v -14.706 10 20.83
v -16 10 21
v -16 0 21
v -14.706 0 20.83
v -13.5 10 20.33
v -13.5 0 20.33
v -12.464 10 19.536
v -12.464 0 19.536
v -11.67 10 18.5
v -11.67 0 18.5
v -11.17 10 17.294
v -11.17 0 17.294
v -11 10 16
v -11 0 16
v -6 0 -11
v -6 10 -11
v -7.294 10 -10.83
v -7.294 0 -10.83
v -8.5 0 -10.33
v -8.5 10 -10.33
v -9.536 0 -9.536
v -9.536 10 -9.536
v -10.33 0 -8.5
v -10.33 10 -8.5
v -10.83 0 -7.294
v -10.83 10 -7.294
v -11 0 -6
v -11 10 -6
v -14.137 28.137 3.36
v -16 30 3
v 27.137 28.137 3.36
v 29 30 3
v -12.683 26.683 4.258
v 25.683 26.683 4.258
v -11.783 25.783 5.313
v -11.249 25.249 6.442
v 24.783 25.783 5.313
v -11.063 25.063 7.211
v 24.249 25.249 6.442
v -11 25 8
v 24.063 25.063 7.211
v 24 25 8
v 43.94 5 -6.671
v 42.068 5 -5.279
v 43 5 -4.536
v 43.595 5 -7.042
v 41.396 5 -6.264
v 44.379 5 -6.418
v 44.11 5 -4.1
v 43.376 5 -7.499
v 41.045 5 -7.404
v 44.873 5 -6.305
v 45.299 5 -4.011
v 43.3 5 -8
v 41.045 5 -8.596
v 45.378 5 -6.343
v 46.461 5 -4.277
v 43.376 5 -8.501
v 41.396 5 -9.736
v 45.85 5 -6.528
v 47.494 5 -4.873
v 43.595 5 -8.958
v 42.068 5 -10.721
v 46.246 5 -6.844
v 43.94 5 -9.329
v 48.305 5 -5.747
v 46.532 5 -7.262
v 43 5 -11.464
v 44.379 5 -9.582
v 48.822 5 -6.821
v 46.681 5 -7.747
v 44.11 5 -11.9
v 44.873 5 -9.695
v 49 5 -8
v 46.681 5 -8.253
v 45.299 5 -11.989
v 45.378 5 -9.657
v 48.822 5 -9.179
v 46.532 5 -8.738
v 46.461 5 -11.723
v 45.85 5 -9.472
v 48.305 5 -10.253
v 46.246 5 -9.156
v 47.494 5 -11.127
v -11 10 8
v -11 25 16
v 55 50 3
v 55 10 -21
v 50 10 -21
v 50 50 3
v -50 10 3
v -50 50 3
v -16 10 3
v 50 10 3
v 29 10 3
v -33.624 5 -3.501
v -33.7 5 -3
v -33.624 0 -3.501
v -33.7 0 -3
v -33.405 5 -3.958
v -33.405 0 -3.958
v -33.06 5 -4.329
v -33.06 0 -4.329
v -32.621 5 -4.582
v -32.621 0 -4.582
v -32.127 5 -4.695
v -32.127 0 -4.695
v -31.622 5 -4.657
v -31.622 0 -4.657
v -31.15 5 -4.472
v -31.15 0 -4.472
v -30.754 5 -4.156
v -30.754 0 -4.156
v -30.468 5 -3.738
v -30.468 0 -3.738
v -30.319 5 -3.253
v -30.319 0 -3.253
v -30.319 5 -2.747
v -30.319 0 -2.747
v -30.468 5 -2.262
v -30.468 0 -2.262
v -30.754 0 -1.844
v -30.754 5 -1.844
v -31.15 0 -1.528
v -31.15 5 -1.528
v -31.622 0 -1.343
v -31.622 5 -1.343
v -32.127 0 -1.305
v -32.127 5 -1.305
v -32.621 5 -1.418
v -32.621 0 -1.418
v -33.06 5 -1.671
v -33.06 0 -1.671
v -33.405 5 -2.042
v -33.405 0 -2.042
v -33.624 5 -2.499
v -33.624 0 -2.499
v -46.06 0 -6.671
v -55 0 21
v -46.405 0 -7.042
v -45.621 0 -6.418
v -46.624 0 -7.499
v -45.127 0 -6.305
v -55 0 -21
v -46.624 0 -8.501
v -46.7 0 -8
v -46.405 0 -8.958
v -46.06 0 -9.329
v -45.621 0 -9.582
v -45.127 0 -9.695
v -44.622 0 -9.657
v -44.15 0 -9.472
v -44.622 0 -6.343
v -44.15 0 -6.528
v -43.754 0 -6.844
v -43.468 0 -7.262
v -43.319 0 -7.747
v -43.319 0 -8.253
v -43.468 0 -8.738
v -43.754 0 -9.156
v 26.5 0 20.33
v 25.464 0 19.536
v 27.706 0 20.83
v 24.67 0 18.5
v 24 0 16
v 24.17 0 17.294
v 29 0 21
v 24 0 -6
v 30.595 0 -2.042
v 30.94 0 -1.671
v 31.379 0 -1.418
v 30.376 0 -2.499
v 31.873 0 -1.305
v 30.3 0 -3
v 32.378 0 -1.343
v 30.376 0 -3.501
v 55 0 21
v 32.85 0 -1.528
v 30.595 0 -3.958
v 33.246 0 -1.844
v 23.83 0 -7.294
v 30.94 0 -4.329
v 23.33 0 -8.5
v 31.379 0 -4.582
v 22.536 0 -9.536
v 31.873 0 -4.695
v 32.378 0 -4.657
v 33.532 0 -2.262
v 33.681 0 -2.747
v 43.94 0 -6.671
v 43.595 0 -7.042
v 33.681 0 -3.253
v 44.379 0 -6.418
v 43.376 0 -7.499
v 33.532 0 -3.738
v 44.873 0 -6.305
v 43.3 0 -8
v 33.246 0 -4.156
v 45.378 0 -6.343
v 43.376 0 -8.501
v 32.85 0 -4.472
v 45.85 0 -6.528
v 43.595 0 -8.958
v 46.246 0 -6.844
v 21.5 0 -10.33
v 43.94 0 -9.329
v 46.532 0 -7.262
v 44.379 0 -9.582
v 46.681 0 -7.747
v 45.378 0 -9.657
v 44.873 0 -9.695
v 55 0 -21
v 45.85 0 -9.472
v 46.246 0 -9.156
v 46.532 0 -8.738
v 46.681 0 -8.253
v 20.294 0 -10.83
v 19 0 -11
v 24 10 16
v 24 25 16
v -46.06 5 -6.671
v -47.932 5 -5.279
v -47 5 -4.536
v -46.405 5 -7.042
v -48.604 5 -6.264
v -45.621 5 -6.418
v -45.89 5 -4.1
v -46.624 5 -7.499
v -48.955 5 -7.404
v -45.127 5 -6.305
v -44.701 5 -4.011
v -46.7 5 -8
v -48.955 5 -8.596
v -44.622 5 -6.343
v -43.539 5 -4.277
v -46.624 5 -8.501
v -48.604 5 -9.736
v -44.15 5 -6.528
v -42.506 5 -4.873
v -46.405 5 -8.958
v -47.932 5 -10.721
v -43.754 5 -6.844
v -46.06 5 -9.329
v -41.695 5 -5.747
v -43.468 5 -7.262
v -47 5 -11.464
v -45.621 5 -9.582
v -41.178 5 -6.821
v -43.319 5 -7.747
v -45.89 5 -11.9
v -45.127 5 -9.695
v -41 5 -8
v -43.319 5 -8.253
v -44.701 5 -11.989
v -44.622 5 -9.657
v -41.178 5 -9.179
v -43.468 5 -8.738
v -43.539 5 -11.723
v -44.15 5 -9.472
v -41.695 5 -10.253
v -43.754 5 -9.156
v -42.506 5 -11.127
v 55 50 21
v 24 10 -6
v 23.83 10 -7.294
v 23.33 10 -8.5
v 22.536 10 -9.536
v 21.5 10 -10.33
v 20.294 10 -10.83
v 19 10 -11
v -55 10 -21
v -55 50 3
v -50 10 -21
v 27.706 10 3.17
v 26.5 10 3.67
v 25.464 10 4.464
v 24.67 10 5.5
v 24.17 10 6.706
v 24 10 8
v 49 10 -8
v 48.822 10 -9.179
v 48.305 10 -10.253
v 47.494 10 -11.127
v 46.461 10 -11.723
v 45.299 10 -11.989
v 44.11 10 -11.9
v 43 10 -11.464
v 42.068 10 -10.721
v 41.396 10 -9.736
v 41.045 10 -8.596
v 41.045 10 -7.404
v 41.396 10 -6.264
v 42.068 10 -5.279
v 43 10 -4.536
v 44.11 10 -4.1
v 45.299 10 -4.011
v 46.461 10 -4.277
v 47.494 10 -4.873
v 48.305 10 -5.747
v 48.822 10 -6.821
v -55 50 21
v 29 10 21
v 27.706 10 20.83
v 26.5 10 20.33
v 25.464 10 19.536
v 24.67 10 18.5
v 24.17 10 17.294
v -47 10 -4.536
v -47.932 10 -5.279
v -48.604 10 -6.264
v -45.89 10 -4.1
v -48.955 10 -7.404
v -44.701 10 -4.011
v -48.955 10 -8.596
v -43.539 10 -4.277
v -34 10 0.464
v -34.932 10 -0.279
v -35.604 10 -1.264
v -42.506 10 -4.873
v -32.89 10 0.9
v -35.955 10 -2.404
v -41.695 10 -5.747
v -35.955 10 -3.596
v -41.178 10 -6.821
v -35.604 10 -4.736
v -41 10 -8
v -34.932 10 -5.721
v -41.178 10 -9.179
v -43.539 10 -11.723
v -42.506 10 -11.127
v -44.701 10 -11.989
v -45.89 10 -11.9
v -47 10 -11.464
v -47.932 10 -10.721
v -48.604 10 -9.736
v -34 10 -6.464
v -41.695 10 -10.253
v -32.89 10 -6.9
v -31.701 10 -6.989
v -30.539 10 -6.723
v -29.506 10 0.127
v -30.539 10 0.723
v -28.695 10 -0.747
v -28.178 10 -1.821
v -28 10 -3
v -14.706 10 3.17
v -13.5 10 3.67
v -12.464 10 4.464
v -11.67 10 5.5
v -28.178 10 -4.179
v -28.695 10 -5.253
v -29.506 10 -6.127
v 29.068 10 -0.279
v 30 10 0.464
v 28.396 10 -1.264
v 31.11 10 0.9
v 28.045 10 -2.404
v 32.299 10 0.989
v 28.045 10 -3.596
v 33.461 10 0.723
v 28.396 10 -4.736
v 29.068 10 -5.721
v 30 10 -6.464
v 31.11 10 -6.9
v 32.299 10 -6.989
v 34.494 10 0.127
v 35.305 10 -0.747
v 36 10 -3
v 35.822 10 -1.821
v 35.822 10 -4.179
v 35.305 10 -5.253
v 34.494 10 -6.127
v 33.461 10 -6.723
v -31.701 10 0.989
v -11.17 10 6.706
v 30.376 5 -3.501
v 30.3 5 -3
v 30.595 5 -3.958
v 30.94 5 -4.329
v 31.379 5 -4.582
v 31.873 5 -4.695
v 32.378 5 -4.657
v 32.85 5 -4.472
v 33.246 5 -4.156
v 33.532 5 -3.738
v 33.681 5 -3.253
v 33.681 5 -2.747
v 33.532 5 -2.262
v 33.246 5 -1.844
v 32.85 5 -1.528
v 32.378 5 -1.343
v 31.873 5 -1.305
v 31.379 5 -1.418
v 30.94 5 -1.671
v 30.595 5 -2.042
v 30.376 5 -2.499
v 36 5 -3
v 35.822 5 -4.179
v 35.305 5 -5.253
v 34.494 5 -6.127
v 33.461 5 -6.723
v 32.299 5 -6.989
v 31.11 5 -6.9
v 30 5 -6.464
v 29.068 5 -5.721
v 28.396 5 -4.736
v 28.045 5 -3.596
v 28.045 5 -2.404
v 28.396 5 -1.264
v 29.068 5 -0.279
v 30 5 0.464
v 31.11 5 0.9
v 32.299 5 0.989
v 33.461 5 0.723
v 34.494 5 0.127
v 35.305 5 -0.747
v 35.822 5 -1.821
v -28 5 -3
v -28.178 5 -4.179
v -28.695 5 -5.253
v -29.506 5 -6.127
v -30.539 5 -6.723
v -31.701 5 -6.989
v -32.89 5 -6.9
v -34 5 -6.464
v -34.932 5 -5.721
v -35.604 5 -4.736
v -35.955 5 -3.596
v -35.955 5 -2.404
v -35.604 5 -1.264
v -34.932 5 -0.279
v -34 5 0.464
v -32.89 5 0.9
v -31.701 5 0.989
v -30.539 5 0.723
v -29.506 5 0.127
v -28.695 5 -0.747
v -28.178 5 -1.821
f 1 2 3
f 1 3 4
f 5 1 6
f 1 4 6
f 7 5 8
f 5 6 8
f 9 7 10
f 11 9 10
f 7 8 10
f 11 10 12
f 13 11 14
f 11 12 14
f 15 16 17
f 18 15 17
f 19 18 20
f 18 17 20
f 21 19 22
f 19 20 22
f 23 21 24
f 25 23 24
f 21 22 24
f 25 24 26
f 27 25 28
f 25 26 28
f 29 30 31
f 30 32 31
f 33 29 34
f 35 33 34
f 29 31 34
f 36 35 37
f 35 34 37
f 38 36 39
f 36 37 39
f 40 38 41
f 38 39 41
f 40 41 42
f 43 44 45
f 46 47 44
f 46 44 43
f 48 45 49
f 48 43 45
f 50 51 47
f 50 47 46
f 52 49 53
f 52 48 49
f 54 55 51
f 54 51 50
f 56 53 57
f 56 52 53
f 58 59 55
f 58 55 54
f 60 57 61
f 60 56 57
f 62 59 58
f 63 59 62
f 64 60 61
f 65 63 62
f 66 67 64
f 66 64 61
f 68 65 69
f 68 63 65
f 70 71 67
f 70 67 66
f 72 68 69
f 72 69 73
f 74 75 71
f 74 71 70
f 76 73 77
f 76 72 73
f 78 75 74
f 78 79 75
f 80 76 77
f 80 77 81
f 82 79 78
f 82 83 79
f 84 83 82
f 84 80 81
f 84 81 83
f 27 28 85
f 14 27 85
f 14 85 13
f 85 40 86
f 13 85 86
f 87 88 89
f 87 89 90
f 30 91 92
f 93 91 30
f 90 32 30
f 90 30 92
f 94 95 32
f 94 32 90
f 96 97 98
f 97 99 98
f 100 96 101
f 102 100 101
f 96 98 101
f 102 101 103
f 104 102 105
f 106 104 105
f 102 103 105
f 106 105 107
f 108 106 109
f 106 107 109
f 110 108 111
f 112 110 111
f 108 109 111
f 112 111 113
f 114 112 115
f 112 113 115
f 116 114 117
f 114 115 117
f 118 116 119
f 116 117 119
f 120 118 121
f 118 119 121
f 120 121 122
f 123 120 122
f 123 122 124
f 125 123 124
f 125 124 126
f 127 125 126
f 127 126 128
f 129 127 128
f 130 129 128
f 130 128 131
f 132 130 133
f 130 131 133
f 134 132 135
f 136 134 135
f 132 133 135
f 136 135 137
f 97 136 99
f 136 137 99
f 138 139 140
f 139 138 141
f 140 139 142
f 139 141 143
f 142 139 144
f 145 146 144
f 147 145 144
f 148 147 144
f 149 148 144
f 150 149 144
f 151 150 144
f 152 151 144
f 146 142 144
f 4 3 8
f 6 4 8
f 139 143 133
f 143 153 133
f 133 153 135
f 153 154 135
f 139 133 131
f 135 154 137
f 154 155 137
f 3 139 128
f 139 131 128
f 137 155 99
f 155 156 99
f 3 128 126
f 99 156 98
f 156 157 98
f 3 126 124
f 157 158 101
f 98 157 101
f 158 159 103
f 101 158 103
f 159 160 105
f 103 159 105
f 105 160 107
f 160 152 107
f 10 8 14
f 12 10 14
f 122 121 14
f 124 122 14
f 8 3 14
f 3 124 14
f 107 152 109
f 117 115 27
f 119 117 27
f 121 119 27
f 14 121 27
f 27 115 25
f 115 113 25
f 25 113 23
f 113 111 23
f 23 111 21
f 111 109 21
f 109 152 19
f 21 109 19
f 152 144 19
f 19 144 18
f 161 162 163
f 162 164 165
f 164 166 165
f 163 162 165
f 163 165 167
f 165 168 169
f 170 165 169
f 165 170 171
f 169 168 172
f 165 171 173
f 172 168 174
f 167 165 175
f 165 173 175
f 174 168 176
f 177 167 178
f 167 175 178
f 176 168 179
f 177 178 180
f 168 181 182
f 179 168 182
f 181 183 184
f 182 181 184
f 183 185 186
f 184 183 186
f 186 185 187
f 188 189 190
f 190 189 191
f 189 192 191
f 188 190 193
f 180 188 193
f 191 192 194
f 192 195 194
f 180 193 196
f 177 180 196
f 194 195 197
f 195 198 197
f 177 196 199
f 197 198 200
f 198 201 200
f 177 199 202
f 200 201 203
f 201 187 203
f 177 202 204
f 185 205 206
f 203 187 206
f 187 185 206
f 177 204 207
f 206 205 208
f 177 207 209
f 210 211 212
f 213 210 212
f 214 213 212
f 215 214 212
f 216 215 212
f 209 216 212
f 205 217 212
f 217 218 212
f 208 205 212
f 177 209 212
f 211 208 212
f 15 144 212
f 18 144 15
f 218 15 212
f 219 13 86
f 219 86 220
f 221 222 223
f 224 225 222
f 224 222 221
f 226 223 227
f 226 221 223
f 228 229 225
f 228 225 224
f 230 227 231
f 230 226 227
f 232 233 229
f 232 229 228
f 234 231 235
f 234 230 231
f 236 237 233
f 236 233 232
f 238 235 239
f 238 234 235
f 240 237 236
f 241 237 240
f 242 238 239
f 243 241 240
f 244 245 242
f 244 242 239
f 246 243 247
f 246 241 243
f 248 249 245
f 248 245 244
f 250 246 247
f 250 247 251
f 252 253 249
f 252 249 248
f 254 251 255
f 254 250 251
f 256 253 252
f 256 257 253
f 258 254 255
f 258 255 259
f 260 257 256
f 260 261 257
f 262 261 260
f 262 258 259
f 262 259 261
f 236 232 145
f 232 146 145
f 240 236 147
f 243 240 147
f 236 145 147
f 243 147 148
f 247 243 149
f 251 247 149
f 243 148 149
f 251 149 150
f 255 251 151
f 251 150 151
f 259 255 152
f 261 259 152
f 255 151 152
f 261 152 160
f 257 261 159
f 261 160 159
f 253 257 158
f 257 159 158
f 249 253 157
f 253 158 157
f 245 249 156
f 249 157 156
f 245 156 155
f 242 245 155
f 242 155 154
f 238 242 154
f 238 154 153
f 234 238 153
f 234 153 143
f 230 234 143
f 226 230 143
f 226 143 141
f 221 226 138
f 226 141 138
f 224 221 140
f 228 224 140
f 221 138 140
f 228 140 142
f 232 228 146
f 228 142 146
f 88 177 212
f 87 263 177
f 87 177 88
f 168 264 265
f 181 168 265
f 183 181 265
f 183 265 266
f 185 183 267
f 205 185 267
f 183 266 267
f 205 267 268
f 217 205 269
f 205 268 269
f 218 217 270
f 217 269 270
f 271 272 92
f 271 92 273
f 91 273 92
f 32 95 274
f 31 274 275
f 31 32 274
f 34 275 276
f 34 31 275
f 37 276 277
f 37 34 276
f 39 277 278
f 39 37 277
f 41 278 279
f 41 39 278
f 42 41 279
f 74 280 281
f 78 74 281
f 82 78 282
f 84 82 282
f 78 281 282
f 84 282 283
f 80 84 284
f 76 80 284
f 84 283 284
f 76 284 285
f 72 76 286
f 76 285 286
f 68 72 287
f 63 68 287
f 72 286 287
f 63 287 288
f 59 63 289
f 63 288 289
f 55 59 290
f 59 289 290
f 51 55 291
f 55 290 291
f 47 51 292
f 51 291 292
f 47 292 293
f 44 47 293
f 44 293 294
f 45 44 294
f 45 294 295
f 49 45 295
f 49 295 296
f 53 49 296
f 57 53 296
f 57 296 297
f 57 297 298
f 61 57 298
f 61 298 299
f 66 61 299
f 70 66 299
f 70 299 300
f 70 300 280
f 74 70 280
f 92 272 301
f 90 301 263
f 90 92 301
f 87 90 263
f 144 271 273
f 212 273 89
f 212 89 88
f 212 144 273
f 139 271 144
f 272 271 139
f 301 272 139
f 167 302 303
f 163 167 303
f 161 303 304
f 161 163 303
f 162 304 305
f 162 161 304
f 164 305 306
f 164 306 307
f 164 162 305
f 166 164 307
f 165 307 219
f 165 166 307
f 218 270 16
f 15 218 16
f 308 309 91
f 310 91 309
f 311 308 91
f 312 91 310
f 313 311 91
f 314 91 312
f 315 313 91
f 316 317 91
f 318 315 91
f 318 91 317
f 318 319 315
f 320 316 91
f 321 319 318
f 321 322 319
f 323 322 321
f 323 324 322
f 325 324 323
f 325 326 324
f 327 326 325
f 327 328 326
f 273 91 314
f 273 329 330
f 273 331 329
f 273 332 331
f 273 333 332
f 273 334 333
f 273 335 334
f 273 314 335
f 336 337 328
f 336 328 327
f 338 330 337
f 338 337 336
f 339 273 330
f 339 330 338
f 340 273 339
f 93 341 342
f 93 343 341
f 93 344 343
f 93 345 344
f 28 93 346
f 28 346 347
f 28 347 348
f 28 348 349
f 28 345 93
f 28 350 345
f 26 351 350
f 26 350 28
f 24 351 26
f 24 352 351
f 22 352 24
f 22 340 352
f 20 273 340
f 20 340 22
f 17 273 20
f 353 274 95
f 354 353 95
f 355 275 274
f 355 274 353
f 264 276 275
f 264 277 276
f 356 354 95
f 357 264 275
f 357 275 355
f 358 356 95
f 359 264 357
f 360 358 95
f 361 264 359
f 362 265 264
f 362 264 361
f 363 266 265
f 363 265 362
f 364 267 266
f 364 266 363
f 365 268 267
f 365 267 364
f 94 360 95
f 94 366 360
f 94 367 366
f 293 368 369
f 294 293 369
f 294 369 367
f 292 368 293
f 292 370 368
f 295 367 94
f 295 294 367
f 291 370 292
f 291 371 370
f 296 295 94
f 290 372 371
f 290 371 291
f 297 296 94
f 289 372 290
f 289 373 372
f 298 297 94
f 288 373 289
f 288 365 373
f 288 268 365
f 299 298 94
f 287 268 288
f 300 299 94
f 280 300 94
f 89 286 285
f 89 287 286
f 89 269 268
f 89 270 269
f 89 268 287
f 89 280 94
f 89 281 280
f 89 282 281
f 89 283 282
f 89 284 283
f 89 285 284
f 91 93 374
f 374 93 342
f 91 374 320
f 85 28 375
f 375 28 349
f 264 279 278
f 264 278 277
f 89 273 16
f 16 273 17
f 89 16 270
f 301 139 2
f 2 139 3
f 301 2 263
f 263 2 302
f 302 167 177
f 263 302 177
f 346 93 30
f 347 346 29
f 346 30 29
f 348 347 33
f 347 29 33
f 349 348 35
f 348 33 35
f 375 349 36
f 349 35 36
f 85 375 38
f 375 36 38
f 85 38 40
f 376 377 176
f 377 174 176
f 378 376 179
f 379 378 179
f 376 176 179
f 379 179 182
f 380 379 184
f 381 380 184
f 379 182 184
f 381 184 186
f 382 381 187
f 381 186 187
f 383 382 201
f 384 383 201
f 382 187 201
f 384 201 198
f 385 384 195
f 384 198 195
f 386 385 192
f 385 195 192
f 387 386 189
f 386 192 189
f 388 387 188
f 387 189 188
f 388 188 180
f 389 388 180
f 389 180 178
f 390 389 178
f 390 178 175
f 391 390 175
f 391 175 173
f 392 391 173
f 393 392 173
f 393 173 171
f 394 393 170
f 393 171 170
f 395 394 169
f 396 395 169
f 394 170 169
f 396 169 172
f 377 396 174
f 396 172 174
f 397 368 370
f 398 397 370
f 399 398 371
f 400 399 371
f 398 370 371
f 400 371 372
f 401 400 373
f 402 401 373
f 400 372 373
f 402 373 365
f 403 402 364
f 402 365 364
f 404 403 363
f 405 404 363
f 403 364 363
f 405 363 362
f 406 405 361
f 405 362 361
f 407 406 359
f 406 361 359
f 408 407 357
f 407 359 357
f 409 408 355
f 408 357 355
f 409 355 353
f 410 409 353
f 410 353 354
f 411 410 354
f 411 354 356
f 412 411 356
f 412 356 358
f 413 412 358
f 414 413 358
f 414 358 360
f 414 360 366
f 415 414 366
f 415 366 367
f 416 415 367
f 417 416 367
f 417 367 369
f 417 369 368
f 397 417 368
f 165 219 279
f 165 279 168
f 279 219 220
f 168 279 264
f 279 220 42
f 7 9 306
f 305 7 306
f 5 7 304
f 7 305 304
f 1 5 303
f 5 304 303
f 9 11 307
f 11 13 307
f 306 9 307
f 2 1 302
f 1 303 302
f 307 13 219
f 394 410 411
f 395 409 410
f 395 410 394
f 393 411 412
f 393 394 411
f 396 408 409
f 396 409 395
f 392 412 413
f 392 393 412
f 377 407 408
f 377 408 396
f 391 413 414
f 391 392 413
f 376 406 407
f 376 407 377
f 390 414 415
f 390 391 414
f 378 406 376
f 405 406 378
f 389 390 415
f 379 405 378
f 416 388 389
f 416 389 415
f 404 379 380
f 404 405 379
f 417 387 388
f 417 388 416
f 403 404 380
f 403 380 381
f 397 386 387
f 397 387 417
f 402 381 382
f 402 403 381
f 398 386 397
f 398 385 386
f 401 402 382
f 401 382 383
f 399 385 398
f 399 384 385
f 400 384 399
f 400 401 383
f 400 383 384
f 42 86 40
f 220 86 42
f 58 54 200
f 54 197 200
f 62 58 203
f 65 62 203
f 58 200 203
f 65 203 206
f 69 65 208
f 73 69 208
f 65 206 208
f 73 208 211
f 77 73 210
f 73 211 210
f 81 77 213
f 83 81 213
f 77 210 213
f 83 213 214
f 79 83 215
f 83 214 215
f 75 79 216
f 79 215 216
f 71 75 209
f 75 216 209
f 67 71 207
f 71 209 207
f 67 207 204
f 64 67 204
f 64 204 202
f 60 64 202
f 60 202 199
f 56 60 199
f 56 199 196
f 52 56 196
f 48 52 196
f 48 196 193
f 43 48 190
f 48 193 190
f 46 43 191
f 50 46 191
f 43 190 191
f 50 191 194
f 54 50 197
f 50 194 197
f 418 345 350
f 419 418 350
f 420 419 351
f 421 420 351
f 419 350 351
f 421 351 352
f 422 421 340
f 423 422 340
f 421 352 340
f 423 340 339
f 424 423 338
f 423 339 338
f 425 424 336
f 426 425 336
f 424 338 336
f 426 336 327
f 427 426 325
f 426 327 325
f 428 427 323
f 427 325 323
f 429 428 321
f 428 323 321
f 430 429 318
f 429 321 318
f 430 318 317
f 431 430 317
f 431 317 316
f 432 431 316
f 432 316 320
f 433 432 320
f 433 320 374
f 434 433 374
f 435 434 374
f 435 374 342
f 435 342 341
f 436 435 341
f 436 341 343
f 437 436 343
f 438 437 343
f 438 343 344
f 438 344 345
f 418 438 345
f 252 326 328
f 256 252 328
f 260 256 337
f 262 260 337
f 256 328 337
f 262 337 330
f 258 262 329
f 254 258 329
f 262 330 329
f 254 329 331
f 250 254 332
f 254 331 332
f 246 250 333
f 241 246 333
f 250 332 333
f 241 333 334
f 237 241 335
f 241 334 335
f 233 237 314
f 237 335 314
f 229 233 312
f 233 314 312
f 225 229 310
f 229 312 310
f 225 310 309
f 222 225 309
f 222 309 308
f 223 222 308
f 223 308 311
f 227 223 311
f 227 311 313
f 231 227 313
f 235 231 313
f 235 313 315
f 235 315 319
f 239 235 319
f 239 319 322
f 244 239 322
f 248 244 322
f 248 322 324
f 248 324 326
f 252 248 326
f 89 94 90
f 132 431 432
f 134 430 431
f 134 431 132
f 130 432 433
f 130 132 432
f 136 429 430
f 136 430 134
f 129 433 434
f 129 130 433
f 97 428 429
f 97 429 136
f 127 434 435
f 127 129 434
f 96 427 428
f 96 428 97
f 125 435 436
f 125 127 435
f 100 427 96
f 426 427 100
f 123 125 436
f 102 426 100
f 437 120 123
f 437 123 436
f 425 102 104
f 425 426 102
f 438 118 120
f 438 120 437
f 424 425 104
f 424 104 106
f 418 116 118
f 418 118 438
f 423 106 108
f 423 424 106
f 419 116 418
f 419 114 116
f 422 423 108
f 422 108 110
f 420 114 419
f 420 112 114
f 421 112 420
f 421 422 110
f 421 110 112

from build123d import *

# Parameters (mm, degrees)
SKETCH1_W                       = 110
SKETCH1_H                       = 42
BOSS_EXTRUDE1_DEPTH             = 10
CBORE_FOR_M3_SBHCS1_D           = 3.4
CBORE_FOR_M3_SBHCS1_CBORE_D     = 8
CBORE_FOR_M3_SBHCS1_CBORE_DEPTH = 5
CUT_EXTRUDE1_DEPTH              = 10
FILLET2_R                       = 5
SKETCH6_W                       = 110
SKETCH6_H                       = 18
BOSS_EXTRUDE2_DEPTH             = 40
BOSS_EXTRUDE3_DEPTH             = 5
BOSS_EXTRUDE4_DEPTH             = 5
SKETCH10_W                      = 35
SKETCH10_H                      = 13
CUT_EXTRUDE2_DEPTH              = 15
FILLET3_R                       = 5


with BuildPart() as part:
    # Sketch1 → Boss-Extrude1 (new body)
    with BuildSketch(Plane(origin=(0, 0, 0), x_dir=(1, 0, 0), z_dir=(0, 1, 0))):
        Rectangle(SKETCH1_W, SKETCH1_H)
    extrude(amount=BOSS_EXTRUDE1_DEPTH)

    # CBORE for M3 SBHCS1 (through all)
    with Locations(Plane(origin=(0, 10, 0), x_dir=(1, 0, 0), z_dir=(0, 1, 0))):
        with Locations((-45, 8), (-32, 3), (32, 3), (45, 8)):
            CounterBoreHole(CBORE_FOR_M3_SBHCS1_D / 2, CBORE_FOR_M3_SBHCS1_CBORE_D / 2, CBORE_FOR_M3_SBHCS1_CBORE_DEPTH)

    # Sketch4 → Cut-Extrude1 (cut)
    with BuildSketch(Plane(origin=(0, 10, 0), x_dir=(1, 0, 0), z_dir=(0, 1, 0))):
        with BuildLine():
            Line((24, -21), (24, 6))
            ThreePointArc((24, 6), (22.535533906, 9.535533906), (19, 11))
            Line((19, 11), (-6, 11))
            ThreePointArc((-6, 11), (-9.535533906, 9.535533906), (-11, 6))
            Line((-11, 6), (-11, -21))
            Line((-11, -21), (24, -21))
        make_face()
    extrude(amount=-CUT_EXTRUDE1_DEPTH, mode=Mode.SUBTRACT)

    # Fillet2
    fillet2_edges = [part.edges().sort_by_distance(p)[0] for p in [
        (-11, 5, 21),
        (24, 5, 21),
    ]]
    fillet(fillet2_edges, radius=FILLET2_R)

    # Sketch6 → Boss-Extrude2 (add)
    with BuildSketch(Plane(origin=(0, 10, 0), x_dir=(1, 0, 0), z_dir=(0, 1, 0))):
        with Locations((0, -12)):
            Rectangle(SKETCH6_W, SKETCH6_H)
    extrude(amount=BOSS_EXTRUDE2_DEPTH)

    # Sketch8 → Boss-Extrude3 (add)
    with BuildSketch(Plane.ZY.offset(55)):
        Polygon((-21, 10), (3, 10), (3, 50), align=None)
    extrude(amount=-BOSS_EXTRUDE3_DEPTH)

    # Sketch9 → Boss-Extrude4 (add)
    with BuildSketch(Plane(origin=(55, 0, 0), x_dir=(0, 0, -1), z_dir=(1, 0, 0))):
        Polygon((-3, 10), (21, 10), (-3, 50), align=None)
    extrude(amount=-BOSS_EXTRUDE4_DEPTH)

    # Sketch10 → Cut-Extrude2 (cut)
    with BuildSketch(Plane.XZ.offset(-10)):
        with Locations((6.5, 9.5)):
            Rectangle(SKETCH10_W, SKETCH10_H)
    extrude(amount=-CUT_EXTRUDE2_DEPTH, mode=Mode.SUBTRACT)

    # Fillet3
    fillet3_edges = [part.edges().sort_by_distance(p)[0] for p in [
        (24, 17.5, 3),
        (6.5, 25, 3),
        (-11, 17.5, 3),
    ]]
    fillet(fillet3_edges, radius=FILLET3_R)


solid = part.part
